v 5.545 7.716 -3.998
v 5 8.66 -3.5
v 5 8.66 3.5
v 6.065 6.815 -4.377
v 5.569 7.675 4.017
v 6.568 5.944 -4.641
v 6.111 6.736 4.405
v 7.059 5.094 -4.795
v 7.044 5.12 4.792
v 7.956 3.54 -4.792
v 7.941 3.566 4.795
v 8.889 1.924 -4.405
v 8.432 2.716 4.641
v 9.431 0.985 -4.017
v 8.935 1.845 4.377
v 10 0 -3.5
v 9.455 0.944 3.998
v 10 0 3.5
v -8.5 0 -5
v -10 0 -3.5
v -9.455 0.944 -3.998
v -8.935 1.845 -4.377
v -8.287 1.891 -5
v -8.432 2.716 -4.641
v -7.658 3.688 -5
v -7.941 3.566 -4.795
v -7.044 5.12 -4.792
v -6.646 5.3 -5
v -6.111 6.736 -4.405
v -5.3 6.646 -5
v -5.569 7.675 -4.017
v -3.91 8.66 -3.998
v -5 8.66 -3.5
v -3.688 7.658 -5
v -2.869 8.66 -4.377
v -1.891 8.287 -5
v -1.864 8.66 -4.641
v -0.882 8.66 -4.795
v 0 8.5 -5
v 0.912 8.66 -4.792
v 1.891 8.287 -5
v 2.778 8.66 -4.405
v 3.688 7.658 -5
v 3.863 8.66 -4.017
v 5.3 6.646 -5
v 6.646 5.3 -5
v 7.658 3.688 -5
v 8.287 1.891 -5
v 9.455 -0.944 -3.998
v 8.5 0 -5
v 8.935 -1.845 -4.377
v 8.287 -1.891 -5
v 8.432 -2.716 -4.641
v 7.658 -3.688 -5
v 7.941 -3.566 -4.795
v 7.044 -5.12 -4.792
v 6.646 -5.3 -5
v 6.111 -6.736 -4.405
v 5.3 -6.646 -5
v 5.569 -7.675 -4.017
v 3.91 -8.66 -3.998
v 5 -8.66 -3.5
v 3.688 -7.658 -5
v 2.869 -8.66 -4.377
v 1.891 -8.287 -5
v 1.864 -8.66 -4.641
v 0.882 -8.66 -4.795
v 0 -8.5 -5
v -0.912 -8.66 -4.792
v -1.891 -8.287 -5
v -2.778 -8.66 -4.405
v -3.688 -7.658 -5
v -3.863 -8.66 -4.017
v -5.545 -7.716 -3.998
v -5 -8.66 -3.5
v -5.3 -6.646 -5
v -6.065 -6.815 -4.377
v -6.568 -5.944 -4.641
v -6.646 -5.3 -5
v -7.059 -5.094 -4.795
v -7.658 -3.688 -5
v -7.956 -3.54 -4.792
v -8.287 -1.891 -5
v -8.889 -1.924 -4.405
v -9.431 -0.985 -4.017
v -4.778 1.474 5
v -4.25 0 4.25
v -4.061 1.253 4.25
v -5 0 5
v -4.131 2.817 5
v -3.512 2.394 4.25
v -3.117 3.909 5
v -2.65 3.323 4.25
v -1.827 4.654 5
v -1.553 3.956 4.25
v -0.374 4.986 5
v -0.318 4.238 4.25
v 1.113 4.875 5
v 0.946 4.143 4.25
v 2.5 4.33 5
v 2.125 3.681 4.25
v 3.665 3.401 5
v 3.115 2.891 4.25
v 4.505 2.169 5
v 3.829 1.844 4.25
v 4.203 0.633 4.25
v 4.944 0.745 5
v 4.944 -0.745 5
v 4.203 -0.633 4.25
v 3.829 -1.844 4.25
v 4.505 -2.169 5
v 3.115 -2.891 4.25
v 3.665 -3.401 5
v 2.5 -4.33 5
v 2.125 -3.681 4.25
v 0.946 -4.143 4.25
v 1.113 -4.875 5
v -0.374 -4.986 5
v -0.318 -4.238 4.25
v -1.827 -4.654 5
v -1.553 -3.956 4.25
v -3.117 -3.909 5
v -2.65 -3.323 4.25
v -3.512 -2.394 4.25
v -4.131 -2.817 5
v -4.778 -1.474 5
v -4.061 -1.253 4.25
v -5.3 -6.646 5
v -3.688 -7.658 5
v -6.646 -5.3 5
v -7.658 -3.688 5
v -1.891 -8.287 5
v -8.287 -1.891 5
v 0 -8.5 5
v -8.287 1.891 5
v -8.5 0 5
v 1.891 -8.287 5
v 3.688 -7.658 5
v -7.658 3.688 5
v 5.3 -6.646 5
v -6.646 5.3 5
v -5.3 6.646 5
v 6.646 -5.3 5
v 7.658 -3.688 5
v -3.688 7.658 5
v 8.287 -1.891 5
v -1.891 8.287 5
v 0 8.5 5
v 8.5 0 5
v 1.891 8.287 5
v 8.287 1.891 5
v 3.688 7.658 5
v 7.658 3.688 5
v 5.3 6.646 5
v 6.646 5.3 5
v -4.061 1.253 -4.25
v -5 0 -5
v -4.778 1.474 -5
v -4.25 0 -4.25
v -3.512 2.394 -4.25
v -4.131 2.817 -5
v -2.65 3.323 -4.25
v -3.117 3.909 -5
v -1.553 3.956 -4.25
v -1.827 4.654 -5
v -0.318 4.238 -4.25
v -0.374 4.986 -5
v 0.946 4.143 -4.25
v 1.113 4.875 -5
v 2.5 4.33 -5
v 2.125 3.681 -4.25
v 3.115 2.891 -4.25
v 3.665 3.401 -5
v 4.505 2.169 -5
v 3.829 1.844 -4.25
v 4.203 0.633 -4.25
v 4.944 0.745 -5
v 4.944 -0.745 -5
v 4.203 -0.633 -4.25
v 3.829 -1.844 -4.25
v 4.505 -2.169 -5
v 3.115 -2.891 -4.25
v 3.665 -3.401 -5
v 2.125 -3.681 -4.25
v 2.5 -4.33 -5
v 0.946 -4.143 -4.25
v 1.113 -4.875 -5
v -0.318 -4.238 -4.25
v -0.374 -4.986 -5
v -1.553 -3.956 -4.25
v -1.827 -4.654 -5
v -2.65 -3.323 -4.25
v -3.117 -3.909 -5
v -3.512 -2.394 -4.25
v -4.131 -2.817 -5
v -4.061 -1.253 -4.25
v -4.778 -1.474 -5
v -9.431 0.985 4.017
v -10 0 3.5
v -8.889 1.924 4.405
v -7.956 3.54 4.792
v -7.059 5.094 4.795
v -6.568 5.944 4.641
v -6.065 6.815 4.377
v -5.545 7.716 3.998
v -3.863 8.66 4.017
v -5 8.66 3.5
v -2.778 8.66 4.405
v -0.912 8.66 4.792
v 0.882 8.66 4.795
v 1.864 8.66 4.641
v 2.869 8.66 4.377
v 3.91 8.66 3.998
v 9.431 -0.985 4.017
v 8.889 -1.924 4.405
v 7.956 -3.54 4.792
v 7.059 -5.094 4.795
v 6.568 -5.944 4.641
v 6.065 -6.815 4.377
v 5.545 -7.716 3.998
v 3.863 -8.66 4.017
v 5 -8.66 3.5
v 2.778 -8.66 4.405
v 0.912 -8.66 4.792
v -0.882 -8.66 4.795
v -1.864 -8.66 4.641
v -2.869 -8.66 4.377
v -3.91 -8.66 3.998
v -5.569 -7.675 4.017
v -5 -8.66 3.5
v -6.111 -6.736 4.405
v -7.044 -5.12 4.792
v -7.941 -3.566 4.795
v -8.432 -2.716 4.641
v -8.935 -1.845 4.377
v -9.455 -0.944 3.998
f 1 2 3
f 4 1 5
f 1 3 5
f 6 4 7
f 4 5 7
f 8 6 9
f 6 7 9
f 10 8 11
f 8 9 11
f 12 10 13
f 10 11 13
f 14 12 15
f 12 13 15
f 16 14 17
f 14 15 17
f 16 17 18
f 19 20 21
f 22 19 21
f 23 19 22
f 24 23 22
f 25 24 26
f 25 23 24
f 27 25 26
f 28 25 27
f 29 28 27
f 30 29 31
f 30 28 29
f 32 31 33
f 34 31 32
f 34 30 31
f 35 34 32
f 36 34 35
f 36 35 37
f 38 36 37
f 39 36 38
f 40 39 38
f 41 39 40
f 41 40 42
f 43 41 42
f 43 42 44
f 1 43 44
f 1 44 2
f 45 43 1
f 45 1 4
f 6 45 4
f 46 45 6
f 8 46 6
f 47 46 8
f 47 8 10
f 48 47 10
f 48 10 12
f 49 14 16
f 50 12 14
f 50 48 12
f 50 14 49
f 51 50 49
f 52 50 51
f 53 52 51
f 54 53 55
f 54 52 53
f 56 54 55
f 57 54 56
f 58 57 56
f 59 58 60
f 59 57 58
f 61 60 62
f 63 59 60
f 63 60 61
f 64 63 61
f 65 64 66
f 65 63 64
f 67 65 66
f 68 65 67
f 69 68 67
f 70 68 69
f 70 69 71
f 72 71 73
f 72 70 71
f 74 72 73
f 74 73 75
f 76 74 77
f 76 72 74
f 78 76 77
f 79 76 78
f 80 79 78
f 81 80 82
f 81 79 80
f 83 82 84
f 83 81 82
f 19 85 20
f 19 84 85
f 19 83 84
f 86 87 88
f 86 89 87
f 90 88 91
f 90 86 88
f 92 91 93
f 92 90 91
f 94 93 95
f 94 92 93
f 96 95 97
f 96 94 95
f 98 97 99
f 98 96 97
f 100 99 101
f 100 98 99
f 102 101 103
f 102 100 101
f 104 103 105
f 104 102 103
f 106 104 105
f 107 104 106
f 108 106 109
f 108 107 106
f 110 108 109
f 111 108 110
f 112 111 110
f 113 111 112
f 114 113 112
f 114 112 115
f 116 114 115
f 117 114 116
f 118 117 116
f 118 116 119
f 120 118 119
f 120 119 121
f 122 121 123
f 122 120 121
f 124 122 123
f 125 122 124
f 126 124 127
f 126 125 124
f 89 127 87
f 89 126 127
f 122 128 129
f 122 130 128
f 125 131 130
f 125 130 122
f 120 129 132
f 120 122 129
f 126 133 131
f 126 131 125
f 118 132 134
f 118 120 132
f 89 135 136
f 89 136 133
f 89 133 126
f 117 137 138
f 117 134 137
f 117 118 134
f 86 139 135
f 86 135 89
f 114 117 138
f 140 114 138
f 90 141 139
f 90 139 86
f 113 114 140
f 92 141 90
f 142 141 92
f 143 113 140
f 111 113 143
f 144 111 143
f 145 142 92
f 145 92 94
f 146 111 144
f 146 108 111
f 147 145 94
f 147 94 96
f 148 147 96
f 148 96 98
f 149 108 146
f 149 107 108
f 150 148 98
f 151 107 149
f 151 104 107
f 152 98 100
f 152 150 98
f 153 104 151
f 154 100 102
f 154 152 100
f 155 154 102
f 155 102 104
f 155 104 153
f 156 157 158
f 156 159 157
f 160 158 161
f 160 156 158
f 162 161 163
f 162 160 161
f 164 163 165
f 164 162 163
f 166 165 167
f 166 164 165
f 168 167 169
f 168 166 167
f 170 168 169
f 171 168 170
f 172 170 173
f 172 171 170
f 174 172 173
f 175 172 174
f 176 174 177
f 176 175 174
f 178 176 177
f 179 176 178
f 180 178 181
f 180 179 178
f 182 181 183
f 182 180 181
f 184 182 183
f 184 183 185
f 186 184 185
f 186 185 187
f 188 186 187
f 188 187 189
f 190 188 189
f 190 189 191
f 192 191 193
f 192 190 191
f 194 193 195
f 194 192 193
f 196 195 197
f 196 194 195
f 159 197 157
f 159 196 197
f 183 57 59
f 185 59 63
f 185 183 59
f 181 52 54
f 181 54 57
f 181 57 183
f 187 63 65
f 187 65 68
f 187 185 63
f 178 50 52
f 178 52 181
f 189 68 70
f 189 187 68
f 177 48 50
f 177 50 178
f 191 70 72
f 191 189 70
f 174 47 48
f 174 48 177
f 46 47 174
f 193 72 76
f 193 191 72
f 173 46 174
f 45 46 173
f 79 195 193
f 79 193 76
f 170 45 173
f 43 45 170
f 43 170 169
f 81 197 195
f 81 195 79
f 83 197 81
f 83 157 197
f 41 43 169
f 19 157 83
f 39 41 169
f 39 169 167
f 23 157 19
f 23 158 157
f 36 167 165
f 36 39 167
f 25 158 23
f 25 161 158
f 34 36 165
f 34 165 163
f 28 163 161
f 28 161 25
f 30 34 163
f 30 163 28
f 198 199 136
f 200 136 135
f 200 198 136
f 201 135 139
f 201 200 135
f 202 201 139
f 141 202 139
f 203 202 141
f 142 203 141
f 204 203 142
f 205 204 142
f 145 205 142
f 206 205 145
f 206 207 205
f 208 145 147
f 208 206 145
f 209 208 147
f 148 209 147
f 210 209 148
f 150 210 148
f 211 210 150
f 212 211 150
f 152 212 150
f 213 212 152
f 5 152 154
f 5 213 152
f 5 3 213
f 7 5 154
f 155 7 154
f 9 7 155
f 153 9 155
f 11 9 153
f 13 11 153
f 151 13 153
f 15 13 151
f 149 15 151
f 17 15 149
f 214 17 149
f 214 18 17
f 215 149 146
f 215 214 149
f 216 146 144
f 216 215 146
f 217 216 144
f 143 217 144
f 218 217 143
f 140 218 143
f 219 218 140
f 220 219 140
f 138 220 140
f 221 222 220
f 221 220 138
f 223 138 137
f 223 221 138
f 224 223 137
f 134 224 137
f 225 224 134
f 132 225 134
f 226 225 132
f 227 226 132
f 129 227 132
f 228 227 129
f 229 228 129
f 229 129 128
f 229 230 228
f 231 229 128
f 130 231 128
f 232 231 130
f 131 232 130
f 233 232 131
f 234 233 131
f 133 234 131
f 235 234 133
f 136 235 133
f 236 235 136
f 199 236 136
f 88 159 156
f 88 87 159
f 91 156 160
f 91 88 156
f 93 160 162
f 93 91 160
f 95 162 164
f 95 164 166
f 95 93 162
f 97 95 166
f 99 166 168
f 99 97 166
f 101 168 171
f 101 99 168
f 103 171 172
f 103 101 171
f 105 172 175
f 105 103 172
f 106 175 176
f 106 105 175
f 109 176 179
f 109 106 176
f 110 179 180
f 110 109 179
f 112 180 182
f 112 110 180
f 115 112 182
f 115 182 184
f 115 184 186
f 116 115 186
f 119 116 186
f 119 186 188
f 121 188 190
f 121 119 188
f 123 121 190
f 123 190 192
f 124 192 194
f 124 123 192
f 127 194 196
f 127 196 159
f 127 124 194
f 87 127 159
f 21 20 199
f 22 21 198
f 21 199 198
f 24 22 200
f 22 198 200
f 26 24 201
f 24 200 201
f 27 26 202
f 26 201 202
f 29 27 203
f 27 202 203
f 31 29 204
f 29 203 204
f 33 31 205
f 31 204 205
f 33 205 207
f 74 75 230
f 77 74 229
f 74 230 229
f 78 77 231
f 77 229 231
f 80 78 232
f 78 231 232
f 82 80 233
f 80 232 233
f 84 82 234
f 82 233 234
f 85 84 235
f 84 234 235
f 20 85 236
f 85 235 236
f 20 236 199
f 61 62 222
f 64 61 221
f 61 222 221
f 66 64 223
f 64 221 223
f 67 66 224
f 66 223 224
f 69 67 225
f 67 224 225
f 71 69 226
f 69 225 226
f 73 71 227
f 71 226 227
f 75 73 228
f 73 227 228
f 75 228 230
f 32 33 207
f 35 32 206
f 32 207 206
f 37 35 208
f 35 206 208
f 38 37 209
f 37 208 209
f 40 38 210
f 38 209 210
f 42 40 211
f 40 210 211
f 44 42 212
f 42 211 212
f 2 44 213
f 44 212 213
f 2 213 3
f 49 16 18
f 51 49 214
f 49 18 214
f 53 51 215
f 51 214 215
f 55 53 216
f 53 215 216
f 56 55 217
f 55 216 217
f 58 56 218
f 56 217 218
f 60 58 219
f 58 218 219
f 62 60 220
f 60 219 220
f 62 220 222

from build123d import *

# Parameters (mm, degrees)
F2_SIZE  = 1.5
F4_DEPTH = 10.001


with BuildPart() as f1:
    # F0 (on Front) → F1 (revolve)
    with BuildSketch(Plane.XZ):
        Polygon((-5, 5), (-10, 5), (-10, -5), (-5, -5), (-4.25, -4.25), (-4.25, 4.25), align=None)
    revolve(axis=Axis((0, 0, 0), (0, 0, -1)))

    # F2
    f2_edges = [f1.edges().sort_by_distance(p)[0] for p in [
        (10, 0, 5),
        (10, 0, -5),
    ]]
    chamfer(f2_edges, length=F2_SIZE)

    # F3 (on face) → F4 (cut, through all)
    with BuildSketch(Plane.XY.offset(5)):
        with BuildLine():
            ThreePointArc((5, 8.660254), (0, 10), (-5, 8.660254))
            Line((-5, 8.660254), (5, 8.660254))
        make_face()
        with BuildLine():
            Line((-10, 0), (-5, 8.660254))
            ThreePointArc((-5, 8.660254), (-8.660254, 5), (-10, 0))
        make_face()
        with BuildLine():
            Line((-5, -8.660254), (-10, 0))
            ThreePointArc((-10, 0), (-8.660254, -5), (-5, -8.660254))
        make_face()
        with BuildLine():
            Line((5, -8.660254), (-5, -8.660254))
            ThreePointArc((-5, -8.660254), (0, -10), (5, -8.660254))
        make_face()
        with BuildLine():
            ThreePointArc((5, -8.660254), (8.660254, -5), (10, 0))
            Line((10, 0), (5, -8.660254))
        make_face()
        with BuildLine():
            ThreePointArc((10, 0), (8.660254, 5), (5, 8.660254))
            Line((5, 8.660254), (10, 0))
        make_face()
    extrude(amount=-F4_DEPTH, mode=Mode.SUBTRACT)


solid = f1.part
